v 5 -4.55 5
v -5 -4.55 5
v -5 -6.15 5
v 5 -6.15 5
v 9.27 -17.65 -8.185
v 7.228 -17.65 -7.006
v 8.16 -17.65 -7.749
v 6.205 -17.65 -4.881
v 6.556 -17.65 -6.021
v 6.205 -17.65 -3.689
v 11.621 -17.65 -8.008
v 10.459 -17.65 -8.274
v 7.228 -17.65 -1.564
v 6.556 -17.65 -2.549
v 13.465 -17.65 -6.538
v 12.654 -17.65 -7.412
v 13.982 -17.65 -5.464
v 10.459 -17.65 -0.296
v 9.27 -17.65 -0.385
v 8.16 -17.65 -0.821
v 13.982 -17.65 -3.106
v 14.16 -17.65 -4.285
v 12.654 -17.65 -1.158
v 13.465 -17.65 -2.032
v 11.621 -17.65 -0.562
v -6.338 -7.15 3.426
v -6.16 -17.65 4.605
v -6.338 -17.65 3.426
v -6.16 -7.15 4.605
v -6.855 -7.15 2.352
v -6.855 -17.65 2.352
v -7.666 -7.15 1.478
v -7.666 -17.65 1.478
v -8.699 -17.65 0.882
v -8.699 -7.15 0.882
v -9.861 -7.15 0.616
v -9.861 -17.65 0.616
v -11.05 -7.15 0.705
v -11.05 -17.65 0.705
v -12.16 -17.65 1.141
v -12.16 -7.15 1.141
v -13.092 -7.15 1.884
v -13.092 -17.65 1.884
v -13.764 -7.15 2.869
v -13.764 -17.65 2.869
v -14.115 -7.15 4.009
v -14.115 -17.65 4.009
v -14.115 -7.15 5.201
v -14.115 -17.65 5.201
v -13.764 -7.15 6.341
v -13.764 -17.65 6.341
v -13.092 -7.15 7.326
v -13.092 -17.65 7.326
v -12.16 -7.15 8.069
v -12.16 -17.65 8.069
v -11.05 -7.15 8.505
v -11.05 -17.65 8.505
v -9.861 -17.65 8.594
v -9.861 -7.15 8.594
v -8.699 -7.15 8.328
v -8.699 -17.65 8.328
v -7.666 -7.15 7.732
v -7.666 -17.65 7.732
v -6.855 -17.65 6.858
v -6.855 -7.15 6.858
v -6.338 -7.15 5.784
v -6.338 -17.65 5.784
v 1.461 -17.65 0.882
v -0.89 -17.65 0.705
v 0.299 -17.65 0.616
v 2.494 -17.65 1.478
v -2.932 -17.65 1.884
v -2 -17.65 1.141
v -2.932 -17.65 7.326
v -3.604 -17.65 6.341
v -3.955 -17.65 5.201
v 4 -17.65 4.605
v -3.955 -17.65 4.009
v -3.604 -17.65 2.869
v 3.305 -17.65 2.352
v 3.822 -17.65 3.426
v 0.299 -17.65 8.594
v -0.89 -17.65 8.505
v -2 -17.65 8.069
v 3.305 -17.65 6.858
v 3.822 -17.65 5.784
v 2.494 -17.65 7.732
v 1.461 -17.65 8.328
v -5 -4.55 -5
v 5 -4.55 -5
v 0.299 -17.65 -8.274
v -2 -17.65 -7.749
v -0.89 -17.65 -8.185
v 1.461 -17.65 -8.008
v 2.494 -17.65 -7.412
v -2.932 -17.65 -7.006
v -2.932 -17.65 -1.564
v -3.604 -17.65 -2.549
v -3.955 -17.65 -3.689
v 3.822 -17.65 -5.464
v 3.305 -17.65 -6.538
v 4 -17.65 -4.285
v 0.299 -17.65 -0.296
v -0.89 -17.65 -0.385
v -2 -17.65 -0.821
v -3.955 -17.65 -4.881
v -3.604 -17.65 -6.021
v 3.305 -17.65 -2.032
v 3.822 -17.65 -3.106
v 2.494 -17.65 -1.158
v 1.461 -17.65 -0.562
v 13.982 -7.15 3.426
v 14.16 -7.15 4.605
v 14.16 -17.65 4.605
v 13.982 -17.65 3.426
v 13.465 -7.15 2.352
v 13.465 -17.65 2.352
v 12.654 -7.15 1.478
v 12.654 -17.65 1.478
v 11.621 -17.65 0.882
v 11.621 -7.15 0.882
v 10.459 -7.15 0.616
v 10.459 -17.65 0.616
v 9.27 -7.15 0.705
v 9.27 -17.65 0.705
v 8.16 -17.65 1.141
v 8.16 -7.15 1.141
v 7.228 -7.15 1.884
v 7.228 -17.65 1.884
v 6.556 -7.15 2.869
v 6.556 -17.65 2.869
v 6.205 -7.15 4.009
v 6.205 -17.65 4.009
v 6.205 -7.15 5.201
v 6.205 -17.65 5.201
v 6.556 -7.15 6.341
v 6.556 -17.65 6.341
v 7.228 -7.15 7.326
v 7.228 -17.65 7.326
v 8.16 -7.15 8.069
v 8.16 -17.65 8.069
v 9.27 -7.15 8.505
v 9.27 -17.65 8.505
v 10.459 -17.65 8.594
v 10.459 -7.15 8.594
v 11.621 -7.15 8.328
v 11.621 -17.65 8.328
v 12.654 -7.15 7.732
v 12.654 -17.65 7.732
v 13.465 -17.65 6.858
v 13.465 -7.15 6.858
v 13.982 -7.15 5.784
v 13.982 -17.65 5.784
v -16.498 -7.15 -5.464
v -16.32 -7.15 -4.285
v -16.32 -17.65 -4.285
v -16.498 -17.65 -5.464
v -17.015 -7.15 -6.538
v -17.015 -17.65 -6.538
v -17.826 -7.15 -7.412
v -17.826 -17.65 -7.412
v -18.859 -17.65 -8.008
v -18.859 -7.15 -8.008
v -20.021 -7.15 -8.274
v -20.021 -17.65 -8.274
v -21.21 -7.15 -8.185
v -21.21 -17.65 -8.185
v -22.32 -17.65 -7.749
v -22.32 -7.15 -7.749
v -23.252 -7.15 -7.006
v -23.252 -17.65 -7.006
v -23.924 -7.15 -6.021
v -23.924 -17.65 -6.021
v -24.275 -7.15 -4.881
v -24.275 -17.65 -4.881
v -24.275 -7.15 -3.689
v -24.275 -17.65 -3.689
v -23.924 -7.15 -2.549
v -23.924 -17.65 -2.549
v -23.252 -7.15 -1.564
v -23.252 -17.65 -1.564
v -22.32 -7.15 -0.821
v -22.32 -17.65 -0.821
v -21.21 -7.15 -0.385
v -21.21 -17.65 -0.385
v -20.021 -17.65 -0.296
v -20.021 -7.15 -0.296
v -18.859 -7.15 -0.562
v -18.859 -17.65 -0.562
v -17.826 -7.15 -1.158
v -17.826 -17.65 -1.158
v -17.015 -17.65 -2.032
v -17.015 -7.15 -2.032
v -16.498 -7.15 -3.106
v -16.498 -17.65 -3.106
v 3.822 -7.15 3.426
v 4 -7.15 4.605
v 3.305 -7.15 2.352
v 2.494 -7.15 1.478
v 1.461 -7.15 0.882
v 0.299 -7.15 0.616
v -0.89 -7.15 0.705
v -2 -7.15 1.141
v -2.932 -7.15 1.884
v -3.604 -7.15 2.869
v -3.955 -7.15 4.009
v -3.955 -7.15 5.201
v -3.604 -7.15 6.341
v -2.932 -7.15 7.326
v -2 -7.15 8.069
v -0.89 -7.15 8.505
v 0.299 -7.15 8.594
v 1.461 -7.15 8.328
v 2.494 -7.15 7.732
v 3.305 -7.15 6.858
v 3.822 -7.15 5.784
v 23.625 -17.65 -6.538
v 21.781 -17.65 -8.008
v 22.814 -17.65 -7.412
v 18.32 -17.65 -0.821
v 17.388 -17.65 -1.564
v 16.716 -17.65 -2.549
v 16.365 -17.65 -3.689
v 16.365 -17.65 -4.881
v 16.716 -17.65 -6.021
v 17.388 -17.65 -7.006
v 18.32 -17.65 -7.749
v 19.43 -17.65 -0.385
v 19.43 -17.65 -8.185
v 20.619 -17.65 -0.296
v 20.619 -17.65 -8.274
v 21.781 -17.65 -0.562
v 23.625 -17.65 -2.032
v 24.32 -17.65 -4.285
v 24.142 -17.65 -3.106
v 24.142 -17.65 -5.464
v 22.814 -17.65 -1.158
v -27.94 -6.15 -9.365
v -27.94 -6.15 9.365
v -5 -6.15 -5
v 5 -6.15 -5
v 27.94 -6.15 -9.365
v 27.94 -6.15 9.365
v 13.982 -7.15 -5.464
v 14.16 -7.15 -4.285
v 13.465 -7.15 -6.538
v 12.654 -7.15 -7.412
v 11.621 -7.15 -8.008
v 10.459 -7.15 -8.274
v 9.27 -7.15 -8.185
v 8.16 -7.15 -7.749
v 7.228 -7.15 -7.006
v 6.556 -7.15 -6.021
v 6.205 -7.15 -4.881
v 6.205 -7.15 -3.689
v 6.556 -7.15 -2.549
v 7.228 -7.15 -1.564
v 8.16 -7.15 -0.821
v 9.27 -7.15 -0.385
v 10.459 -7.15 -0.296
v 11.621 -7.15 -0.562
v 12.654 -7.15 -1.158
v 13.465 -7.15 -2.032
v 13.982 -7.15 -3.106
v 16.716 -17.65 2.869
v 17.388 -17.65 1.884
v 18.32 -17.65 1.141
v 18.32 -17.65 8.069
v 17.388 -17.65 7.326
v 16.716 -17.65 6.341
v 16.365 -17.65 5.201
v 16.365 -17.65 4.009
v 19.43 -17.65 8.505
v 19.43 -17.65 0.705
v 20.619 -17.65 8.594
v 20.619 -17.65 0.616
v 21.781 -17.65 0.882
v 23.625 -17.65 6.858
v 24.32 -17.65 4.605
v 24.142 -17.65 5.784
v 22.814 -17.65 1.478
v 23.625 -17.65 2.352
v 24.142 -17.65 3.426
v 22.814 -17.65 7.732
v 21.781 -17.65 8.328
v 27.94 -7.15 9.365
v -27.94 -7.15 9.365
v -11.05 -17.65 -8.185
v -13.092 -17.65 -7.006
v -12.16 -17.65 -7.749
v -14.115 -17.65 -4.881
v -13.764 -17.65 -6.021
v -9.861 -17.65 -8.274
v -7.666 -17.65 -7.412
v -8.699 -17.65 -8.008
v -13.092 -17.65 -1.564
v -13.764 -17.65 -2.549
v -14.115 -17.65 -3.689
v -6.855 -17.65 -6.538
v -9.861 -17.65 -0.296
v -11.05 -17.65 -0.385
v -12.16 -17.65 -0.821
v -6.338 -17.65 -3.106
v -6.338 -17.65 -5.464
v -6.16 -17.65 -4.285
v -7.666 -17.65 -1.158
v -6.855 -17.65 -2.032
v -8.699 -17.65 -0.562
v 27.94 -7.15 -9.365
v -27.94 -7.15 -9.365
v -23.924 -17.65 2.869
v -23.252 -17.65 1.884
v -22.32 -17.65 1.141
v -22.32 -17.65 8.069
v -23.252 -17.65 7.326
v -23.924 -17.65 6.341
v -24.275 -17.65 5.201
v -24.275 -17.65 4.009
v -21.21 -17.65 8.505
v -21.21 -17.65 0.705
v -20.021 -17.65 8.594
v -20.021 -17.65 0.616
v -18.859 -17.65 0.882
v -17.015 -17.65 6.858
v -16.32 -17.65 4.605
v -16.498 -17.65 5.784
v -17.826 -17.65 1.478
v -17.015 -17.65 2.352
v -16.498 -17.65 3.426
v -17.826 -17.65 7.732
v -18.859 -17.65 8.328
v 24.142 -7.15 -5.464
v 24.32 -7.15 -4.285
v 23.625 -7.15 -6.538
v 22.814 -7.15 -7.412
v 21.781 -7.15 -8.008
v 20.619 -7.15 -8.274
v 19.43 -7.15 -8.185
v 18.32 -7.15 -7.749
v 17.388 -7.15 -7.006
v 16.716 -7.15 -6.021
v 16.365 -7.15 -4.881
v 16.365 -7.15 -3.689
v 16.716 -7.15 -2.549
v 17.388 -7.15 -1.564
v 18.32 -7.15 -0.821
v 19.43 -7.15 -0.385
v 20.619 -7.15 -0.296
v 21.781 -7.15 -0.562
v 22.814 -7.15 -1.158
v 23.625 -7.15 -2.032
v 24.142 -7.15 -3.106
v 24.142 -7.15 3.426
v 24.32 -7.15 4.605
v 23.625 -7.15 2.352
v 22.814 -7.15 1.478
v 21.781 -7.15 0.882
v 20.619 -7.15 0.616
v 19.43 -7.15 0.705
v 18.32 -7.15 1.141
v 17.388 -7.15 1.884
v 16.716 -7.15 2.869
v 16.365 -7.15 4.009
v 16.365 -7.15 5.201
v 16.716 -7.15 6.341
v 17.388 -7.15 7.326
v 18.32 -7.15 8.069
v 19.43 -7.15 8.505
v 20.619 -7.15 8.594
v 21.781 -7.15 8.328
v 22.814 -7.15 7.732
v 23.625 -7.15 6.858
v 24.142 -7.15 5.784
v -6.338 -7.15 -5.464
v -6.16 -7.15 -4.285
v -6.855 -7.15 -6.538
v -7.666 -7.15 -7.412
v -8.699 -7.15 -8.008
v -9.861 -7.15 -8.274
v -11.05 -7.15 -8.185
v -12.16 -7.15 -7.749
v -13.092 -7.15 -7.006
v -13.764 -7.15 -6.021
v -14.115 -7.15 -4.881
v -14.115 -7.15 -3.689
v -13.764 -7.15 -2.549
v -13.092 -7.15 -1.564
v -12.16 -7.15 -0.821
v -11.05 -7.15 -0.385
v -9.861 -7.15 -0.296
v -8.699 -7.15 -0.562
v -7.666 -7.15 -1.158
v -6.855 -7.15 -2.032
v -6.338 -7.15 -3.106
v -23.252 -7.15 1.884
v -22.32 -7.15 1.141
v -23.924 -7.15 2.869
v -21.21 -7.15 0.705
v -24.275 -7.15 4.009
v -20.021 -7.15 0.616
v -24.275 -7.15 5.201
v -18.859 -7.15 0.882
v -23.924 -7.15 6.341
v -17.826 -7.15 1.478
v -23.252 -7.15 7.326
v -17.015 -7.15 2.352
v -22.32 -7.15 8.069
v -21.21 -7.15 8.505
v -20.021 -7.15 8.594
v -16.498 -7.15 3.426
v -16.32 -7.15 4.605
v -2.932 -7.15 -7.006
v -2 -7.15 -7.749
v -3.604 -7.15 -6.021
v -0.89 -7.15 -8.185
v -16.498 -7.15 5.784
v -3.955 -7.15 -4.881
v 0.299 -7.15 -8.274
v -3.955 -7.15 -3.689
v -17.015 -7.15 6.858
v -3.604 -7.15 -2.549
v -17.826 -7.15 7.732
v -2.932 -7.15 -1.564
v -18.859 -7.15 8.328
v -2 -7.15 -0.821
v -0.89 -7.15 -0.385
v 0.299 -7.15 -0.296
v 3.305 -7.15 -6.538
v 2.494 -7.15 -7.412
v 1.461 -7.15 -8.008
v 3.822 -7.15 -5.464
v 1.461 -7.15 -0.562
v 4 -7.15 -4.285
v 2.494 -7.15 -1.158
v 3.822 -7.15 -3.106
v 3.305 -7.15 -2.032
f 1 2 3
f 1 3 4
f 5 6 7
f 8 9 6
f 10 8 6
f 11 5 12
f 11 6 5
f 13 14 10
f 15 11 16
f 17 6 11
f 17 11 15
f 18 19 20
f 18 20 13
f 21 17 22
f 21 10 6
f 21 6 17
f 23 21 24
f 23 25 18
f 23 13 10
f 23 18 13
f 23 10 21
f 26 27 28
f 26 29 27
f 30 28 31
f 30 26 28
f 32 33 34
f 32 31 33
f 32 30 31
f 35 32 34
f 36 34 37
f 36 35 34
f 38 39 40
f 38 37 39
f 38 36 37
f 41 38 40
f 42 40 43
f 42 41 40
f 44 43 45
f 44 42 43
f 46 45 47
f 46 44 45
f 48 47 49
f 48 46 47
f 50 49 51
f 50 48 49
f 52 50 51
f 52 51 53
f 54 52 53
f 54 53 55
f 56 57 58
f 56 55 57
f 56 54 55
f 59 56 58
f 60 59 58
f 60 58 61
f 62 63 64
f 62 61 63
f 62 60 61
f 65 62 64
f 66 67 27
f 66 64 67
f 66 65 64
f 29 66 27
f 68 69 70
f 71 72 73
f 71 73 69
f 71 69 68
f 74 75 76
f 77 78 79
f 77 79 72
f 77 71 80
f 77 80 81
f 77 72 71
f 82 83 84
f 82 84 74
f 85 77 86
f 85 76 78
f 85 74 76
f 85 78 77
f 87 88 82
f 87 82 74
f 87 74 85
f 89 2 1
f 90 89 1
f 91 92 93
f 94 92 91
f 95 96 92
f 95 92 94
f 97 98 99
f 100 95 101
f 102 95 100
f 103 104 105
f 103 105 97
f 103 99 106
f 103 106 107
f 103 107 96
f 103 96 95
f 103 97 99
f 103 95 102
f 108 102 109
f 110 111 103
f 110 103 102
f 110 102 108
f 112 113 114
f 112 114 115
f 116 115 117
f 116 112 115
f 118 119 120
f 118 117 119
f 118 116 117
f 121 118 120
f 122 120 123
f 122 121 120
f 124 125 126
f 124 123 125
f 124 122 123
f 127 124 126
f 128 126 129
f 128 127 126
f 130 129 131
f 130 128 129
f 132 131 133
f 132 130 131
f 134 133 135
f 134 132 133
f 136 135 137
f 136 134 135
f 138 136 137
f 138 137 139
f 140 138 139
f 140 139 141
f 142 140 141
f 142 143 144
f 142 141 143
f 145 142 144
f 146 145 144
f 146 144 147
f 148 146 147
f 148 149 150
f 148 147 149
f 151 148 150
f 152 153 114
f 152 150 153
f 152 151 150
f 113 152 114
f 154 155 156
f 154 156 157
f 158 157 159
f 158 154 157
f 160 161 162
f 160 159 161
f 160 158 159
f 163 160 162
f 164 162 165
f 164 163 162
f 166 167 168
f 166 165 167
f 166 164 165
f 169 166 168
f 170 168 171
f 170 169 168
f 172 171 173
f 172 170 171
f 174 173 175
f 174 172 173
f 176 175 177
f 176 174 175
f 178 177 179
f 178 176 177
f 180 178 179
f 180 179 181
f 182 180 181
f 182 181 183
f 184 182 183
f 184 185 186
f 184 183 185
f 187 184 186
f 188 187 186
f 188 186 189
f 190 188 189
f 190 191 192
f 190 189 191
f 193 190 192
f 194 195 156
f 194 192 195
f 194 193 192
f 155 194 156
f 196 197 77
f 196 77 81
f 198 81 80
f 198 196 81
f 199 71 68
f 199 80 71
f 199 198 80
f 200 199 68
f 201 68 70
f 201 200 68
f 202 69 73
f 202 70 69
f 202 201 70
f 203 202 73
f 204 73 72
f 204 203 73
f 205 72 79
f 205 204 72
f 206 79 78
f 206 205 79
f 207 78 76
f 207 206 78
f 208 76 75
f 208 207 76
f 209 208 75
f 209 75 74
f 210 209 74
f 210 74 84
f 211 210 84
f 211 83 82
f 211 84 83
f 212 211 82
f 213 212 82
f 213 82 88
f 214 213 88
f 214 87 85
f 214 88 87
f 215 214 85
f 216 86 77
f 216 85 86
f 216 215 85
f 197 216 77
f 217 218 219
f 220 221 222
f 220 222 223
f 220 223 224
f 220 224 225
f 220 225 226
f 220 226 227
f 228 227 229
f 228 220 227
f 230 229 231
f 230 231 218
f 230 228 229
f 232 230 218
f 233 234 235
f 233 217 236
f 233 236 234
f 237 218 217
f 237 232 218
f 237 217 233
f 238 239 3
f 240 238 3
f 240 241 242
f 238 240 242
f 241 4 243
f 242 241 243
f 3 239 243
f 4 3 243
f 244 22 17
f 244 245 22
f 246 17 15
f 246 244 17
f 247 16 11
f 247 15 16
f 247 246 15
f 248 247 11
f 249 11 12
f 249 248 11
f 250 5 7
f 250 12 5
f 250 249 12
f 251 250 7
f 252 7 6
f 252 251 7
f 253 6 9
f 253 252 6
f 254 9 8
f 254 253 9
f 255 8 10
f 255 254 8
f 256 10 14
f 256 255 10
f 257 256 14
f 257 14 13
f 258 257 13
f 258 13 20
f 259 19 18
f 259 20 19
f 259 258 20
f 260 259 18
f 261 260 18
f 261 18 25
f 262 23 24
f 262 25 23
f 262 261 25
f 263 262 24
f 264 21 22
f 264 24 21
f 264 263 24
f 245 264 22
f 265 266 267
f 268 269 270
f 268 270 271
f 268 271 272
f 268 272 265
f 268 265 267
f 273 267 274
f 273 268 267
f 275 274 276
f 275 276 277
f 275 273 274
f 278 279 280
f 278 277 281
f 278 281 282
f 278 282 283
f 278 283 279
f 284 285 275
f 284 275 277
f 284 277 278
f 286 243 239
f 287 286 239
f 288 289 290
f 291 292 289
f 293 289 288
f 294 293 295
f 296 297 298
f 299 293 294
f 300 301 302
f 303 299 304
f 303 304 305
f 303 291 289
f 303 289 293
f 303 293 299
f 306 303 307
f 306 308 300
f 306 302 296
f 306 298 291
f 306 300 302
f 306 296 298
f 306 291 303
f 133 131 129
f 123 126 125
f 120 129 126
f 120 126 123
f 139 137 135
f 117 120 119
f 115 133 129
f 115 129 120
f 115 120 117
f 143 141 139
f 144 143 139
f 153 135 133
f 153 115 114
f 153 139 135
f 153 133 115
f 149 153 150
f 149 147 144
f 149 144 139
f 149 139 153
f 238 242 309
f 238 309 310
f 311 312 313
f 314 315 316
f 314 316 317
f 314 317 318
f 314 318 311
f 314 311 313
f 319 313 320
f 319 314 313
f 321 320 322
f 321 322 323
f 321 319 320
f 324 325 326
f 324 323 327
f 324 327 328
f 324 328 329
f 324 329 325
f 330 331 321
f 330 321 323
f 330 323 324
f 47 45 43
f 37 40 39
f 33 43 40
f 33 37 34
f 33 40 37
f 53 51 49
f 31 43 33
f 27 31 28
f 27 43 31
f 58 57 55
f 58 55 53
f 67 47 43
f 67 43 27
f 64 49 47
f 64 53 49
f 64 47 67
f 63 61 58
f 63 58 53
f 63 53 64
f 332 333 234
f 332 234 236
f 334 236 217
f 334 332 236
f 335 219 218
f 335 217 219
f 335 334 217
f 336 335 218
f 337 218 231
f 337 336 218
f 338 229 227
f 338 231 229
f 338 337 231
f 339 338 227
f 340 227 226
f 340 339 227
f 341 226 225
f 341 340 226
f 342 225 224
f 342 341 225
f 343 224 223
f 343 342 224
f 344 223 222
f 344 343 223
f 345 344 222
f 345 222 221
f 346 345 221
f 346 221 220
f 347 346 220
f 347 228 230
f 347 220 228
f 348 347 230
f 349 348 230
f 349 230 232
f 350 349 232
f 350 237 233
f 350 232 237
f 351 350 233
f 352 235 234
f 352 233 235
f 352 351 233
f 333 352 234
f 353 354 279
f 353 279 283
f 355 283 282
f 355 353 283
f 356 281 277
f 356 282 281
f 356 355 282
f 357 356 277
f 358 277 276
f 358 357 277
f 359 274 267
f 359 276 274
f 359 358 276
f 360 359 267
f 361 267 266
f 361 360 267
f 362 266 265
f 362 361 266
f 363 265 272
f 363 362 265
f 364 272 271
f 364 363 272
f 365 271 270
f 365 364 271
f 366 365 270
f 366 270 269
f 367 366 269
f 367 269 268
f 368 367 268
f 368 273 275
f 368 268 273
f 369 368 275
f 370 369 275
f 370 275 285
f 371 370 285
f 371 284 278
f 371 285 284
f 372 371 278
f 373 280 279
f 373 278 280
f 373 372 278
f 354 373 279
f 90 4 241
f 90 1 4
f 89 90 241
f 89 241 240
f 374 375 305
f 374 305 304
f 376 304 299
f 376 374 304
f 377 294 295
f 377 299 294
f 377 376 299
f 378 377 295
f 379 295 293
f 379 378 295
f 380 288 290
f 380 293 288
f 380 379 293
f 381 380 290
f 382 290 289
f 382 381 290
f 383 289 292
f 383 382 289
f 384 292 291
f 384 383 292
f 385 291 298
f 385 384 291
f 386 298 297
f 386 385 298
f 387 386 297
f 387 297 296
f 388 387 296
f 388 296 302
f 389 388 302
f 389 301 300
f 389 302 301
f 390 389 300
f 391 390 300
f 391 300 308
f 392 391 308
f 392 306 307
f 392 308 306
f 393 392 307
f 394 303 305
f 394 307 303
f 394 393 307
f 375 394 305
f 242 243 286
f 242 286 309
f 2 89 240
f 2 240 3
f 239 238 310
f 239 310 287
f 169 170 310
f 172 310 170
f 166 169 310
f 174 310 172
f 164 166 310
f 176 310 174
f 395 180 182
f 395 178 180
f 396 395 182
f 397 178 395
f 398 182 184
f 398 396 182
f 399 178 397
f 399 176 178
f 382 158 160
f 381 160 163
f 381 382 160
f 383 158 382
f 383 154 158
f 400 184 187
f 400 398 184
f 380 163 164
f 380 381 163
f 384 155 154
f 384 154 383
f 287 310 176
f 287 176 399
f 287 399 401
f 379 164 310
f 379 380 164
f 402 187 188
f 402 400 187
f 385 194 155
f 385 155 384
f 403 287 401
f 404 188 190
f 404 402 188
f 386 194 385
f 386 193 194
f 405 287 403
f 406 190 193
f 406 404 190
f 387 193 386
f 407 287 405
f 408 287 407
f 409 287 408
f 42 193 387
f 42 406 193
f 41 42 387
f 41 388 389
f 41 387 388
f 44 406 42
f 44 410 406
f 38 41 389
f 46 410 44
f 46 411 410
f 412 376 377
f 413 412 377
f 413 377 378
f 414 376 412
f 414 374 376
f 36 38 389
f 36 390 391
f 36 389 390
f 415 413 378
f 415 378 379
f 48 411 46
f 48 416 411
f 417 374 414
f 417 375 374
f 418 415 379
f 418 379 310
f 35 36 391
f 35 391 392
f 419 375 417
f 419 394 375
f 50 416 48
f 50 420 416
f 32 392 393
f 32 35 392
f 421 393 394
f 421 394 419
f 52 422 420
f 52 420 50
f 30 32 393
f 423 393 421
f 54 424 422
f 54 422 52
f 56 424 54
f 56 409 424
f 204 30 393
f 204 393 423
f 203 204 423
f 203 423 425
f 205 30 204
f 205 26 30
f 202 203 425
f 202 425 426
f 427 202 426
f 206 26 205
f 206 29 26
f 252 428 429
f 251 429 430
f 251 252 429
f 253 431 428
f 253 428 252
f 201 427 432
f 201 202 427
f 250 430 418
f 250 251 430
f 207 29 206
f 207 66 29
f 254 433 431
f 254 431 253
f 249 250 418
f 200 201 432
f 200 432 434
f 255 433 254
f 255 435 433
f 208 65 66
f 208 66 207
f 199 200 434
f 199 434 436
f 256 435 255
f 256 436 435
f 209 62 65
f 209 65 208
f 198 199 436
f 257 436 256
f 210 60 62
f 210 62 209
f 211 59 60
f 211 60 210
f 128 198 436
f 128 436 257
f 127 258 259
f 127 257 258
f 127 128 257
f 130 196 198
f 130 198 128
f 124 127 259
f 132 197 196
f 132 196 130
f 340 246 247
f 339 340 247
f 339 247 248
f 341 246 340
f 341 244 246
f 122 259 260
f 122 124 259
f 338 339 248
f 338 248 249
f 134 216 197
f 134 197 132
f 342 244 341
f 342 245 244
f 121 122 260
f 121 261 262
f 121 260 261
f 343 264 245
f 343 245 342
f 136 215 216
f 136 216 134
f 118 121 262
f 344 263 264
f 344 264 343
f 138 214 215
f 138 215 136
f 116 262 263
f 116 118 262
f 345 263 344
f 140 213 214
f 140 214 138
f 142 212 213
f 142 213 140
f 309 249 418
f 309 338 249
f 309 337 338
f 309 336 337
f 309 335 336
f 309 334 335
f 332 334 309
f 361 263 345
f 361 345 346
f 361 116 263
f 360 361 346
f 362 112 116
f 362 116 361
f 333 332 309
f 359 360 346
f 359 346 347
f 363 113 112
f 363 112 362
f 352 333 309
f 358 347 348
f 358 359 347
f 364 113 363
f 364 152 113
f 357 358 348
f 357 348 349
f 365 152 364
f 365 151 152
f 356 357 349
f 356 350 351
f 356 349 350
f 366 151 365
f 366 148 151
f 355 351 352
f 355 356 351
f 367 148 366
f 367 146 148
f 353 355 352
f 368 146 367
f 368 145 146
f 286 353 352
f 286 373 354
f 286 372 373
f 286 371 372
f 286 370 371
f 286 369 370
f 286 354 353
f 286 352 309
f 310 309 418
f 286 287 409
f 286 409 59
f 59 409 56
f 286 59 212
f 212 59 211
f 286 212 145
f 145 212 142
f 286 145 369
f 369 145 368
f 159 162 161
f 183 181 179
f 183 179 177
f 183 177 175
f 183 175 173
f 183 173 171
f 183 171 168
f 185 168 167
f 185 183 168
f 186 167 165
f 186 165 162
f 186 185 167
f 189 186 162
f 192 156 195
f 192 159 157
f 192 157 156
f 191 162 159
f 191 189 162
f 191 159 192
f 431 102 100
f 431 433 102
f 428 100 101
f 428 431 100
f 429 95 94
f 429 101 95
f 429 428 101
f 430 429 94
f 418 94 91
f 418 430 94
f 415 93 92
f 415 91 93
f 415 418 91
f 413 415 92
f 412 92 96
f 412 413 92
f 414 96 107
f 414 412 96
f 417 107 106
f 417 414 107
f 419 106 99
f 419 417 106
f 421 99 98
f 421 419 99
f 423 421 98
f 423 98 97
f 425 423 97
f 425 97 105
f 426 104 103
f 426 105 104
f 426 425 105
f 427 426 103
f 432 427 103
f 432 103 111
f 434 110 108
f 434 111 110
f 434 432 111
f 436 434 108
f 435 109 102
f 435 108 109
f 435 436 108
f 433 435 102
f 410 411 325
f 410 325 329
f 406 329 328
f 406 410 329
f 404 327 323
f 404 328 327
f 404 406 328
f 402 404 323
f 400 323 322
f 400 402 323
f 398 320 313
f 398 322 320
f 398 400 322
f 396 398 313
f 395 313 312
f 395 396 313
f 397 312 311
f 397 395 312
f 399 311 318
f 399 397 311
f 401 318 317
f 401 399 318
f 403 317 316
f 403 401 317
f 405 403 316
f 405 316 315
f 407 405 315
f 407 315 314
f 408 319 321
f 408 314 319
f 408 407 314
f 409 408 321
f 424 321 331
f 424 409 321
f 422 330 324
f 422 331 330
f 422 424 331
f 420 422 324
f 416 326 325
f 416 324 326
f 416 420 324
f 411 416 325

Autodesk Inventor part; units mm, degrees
ref_plane "YZ Plane" through (0, 0, 0) normal (1, 0, 0) x (0, 1, 0)
ref_plane "XZ Plane" through (0, 0, 0) normal (0, 1, 0) x (-1, 0, 0)
ref_plane "XY Plane" through (0, 0, 0) normal (0, 0, 1) x (1, 0, 0)
sketch "Szkic1" plane through (0, 0, 0) normal (0, 1, 0) x (-1, 0, 0)
  line L0 (27.94, 9.365) -> (-27.94, 9.365)
  line L1 (-27.94, 9.365) -> (-27.94, -9.365)
  line L2 (-27.94, -9.365) -> (27.94, -9.365)
  line L3 (27.94, -9.365) -> (27.94, 9.365)
  point P0 (0, 0)
  dimension "d0" = 18.73
  dimension "d1" = 9.365
  dimension "d2" = 55.88
  dimension "d3" = 27.94
extrude "Wyciągnięcie proste1" add sketch "Szkic1" along normal blind 1
sketch "Szkic2" plane through (0, 1, 0) normal (0, 1, 0) x (1, 0, 0)
  line L0 (-25.4, -8.095) -> (-20.32, -8.095)
  line L1 (-20.32, -8.095) -> (-20.32, -2.065)
  line L2 (-20.32, -2.065) -> (-25.4, -2.065)
  line L3 (-25.4, -2.065) -> (-25.4, -8.095)
  line L4 (-27.94, 9.365) -> (-27.94, -9.365) projected
  line L5 (-27.94, -9.365) -> (27.94, -9.365) projected
  line L6 (-19.68, -8.095) -> (-14.6, -8.095)
  line L7 (-14.6, -8.095) -> (-14.6, -2.065)
  line L8 (-14.6, -2.065) -> (-19.68, -2.065)
  line L9 (-19.68, -2.065) -> (-19.68, -8.095)
  line L10 (-13.96, -8.095) -> (-8.88, -8.095)
  line L11 (-8.88, -8.095) -> (-8.88, -2.065)
  line L12 (-8.88, -2.065) -> (-13.96, -2.065)
  line L13 (-13.96, -2.065) -> (-13.96, -8.095)
  line L14 (-8.24, -8.095) -> (-3.16, -8.095)
  line L15 (-3.16, -8.095) -> (-3.16, -2.065)
  line L16 (-3.16, -2.065) -> (-8.24, -2.065)
  line L17 (-8.24, -2.065) -> (-8.24, -8.095)
  line L18 (-2.52, -8.095) -> (2.56, -8.095)
  line L19 (2.56, -8.095) -> (2.56, -2.065)
  line L20 (2.56, -2.065) -> (-2.52, -2.065)
  line L21 (-2.52, -2.065) -> (-2.52, -8.095)
  line L22 (3.2, -8.095) -> (8.28, -8.095)
  line L23 (8.28, -8.095) -> (8.28, -2.065)
  line L24 (8.28, -2.065) -> (3.2, -2.065)
  line L25 (3.2, -2.065) -> (3.2, -8.095)
  line L26 (8.92, -8.095) -> (14, -8.095)
  line L27 (14, -8.095) -> (14, -2.065)
  line L28 (14, -2.065) -> (8.92, -2.065)
  line L29 (8.92, -2.065) -> (8.92, -8.095)
  line L30 (14.64, -8.095) -> (19.72, -8.095)
  line L31 (19.72, -8.095) -> (19.72, -2.065)
  line L32 (19.72, -2.065) -> (14.64, -2.065)
  line L33 (14.64, -2.065) -> (14.64, -8.095)
  line L34 (20.36, -8.095) -> (25.44, -8.095)
  line L35 (25.44, -8.095) -> (25.44, -2.065)
  line L36 (25.44, -2.065) -> (20.36, -2.065)
  line L37 (20.36, -2.065) -> (20.36, -8.095)
  line L38 (-25.4, -0.475) -> (-20.32, -0.475)
  line L39 (-20.32, -0.475) -> (-20.32, 5.555)
  line L40 (-20.32, 5.555) -> (-25.4, 5.555)
  line L41 (-25.4, 5.555) -> (-25.4, -0.475)
  line L42 (-19.68, -0.475) -> (-14.6, -0.475)
  line L43 (-14.6, -0.475) -> (-14.6, 5.555)
  line L44 (-14.6, 5.555) -> (-19.68, 5.555)
  line L45 (-19.68, 5.555) -> (-19.68, -0.475)
  line L46 (-13.96, -0.475) -> (-8.88, -0.475)
  line L47 (-8.88, -0.475) -> (-8.88, 5.555)
  line L48 (-8.88, 5.555) -> (-13.96, 5.555)
  line L49 (-13.96, 5.555) -> (-13.96, -0.475)
  line L50 (19.72, 5.555) -> (14.64, 5.555)
  line L51 (19.72, -0.475) -> (19.72, 5.555)
  line L52 (14.64, -0.475) -> (19.72, -0.475)
  line L53 (14.64, 5.555) -> (14.64, -0.475)
  line L54 (25.44, 5.555) -> (20.36, 5.555)
  line L55 (25.44, -0.475) -> (25.44, 5.555)
  line L56 (20.36, -0.475) -> (25.44, -0.475)
  line L57 (20.36, 5.555) -> (20.36, -0.475)
  line L58 (-3.16, 5.555) -> (-8.24, 5.555)
  line L59 (-3.16, -0.475) -> (-3.16, 5.555)
  line L60 (-8.24, -0.475) -> (-3.16, -0.475)
  line L61 (-8.24, 5.555) -> (-8.24, -0.475)
  line L62 (2.56, 5.555) -> (-2.52, 5.555)
  line L63 (2.56, -0.475) -> (2.56, 5.555)
  line L64 (-2.52, -0.475) -> (2.56, -0.475)
  line L65 (-2.52, 5.555) -> (-2.52, -0.475)
  line L66 (8.28, 5.555) -> (3.2, 5.555)
  line L67 (8.28, -0.475) -> (8.28, 5.555)
  line L68 (3.2, -0.475) -> (8.28, -0.475)
  line L69 (3.2, 5.555) -> (3.2, -0.475)
  line L70 (14, 5.555) -> (8.92, 5.555)
  line L71 (14, -0.475) -> (14, 5.555)
  line L72 (8.92, -0.475) -> (14, -0.475)
  line L73 (8.92, 5.555) -> (8.92, -0.475)
  point P0 (0, 0)
  dimension "d6" = 6.03
  dimension "d7" = 5.08
  dimension "d8" = 2.54
  dimension "d9" = 1.27
  dimension "d10" = 5.08
  dimension "d11" = 6.03
  dimension "d12" = 1.27
  dimension "d13" = 0.64
  dimension "d14" = 5.08
  dimension "d15" = 6.03
  dimension "d16" = 1.27
  dimension "d17" = 0.64
  dimension "d18" = 5.08
  dimension "d19" = 6.03
  dimension "d20" = 1.27
  dimension "d21" = 0.64
  dimension "d22" = 5.08
  dimension "d23" = 6.03
  dimension "d24" = 1.27
  dimension "d25" = 0.64
  dimension "d26" = 5.08
  dimension "d27" = 6.03
  dimension "d28" = 5.08
  dimension "d29" = 6.03
  dimension "d30" = 5.08
  dimension "d31" = 6.03
  dimension "d32" = 5.08
  dimension "d33" = 6.03
  dimension "d34" = 0.64
  dimension "d35" = 0.64
  dimension "d36" = 0.64
  dimension "d37" = 0.64
  dimension "d38" = 1.27
  dimension "d39" = 1.27
  dimension "d40" = 1.27
  dimension "d41" = 1.27
  dimension "d42" = 6.03
  dimension "d43" = 5.08
  dimension "d44" = 6.03
  dimension "d45" = 5.08
  dimension "d46" = 6.03
  dimension "d47" = 5.08
  dimension "d48" = 1.59
  dimension "d49" = 0
  dimension "d50" = 0
  dimension "d51" = 0
  dimension "d52" = 0
  dimension "d53" = 0
  dimension "d54" = 5.08
  dimension "d55" = 6.03
  dimension "d56" = 5.08
  dimension "d57" = 6.03
  dimension "d58" = 0.64
  dimension "d59" = 0
  dimension "d60" = 0
  dimension "d61" = 0
  dimension "d62" = 5.08
  dimension "d63" = 6.03
  dimension "d64" = 5.08
  dimension "d65" = 6.03
  dimension "d66" = 0.64
  dimension "d67" = 0
  dimension "d68" = 0
  dimension "d69" = 0
extrude "Wyciągnięcie proste2" add sketch "Szkic2" along normal blind 1
chamfer "Faza1" distance 0.2 angle 45 4 edges at (22.9, 2, 8.095) (25.44, 2, 5.08) (20.36, 2, 5.08) (22.9, 2, 2.065)
chamfer "Faza2" distance 0.2 angle 45 68 edges at (17.18, 2, 8.095) (19.72, 2, 5.08) (14.64, 2, 5.08) (17.18, 2, 2.065) (14, 2, 5.08) (11.46, 2, 8.095) (8.92, 2, 5.08) (11.46, 2, 2.065) (8.28, 2, 5.08) (5.74, 2, 8.095) (3.2, 2, 5.08) (5.74, 2, 2.065) (0.02, 2, 8.095) (-5.7, 2, 8.095) (-11.42, 2, 8.095) (-17.14, 2, 8.095) (-22.86, 2, 8.095) (-25.4, 2, 5.08) (-22.86, 2, 2.065) (-17.14, 2, 2.065) (-19.68, 2, 5.08) (-14.6, 2, 5.08) (-13.96, 2, 5.08) (-8.88, 2, 5.08) (-11.42, 2, 2.065) (-5.7, 2, 2.065) (-3.16, 2, 5.08) (-8.24, 2, 5.08) (-20.32, 2, 5.08) (-20.32, 2, -2.54) (-22.86, 2, 0.475) (-25.4, 2, -2.54) (-22.86, 2, -5.555) (-17.14, 2, -5.555) (-19.68, 2, -2.54) (-17.14, 2, 0.475) (-14.6, 2, -2.54) (-11.42, 2, 0.475) (-13.96, 2, -2.54) (-11.42, 2, -5.555) (-8.88, 2, -2.54) (-5.7, 2, 0.475) (-8.24, 2, -2.54) (-5.7, 2, -5.555) (-3.16, 2, -2.54) (0.02, 2, 2.065) (-2.52, 2, 5.08) (0.02, 2, 0.475) (-2.52, 2, -2.54) (0.02, 2, -5.555) (2.56, 2, -2.54) (5.74, 2, 0.475) (3.2, 2, -2.54) (5.74, 2, -5.555) (8.28, 2, -2.54) (11.46, 2, 0.475) (8.92, 2, -2.54) (11.46, 2, -5.555) (14, 2, -2.54) (17.18, 2, 0.475) (17.18, 2, -5.555) (14.64, 2, -2.54) (19.72, 2, -2.54) (22.9, 2, 0.475) (20.36, 2, -2.54) (22.9, 2, -5.555) (25.44, 2, -2.54) (2.56, 2, 5.08)
chamfer "Faza3" distance 0.5 angle 45 18 edges at (25.44, 1.4, 8.095) (19.72, 1.4, 8.095) (14, 1.4, 8.095) (8.28, 1.4, 8.095) (2.56, 1.4, 8.095) (2.56, 1.4, 0.475) (8.28, 1.4, 0.475) (14, 1.4, 0.475) (19.72, 1.4, 0.475) (25.44, 1.4, 0.475) (-3.16, 1.4, 0.475) (-3.16, 1.4, 8.095) (-8.88, 1.4, 8.095) (-14.6, 1.4, 8.095) (-8.88, 1.4, 0.475) (-14.6, 1.4, 0.475) (-20.32, 1.4, 0.475) (-20.32, 1.4, 8.095)
sketch "Szkic3" plane through (0, 0, 0) normal (0, -1, 0) x (1, 0, 0)
  line L0 (-25.08, -2.085) -> (-21.9, -2.085)
  line L1 (-21.9, -2.085) -> (-21.9, -8.435)
  line L2 (-21.9, -8.435) -> (-25.08, -8.435)
  line L3 (-25.08, -8.435) -> (-25.08, -2.085)
  line L4 (-25.4, 0.475) -> (-25.4, -5.555) projected
  line L5 (27.94, -9.365) -> (-27.94, -9.365) projected
  line L6 (-19.36, -2.085) -> (-16.18, -2.085)
  line L7 (-16.18, -2.085) -> (-16.18, -8.435)
  line L8 (-16.18, -8.435) -> (-19.36, -8.435)
  line L9 (-19.36, -8.435) -> (-19.36, -2.085)
  line L10 (-19.68, 0.475) -> (-19.68, -5.555) projected
  line L11 (-13.64, -2.085) -> (-10.46, -2.085)
  line L12 (-10.46, -2.085) -> (-10.46, -8.435)
  line L13 (-10.46, -8.435) -> (-13.64, -8.435)
  line L14 (-13.64, -8.435) -> (-13.64, -2.085)
  line L15 (-7.92, -2.085) -> (-4.74, -2.085)
  line L16 (-4.74, -2.085) -> (-4.74, -8.435)
  line L17 (-4.74, -8.435) -> (-7.92, -8.435)
  line L18 (-7.92, -8.435) -> (-7.92, -2.085)
  line L19 (-2.2, -2.085) -> (0.98, -2.085)
  line L20 (0.98, -2.085) -> (0.98, -8.435)
  line L21 (0.98, -8.435) -> (-2.2, -8.435)
  line L22 (-2.2, -8.435) -> (-2.2, -2.085)
  line L23 (3.52, -2.085) -> (6.7, -2.085)
  line L24 (6.7, -2.085) -> (6.7, -8.435)
  line L25 (6.7, -8.435) -> (3.52, -8.435)
  line L26 (3.52, -8.435) -> (3.52, -2.085)
  line L27 (9.24, -2.085) -> (12.42, -2.085)
  line L28 (12.42, -2.085) -> (12.42, -8.435)
  line L29 (12.42, -8.435) -> (9.24, -8.435)
  line L30 (9.24, -8.435) -> (9.24, -2.085)
  line L31 (14.96, -8.435) -> (14.96, -2.085)
  line L32 (14.96, -2.085) -> (18.14, -2.085)
  line L33 (18.14, -2.085) -> (18.14, -8.435)
  line L34 (18.14, -8.435) -> (14.96, -8.435)
  line L35 (20.68, -8.435) -> (20.68, -2.085)
  line L36 (20.68, -2.085) -> (23.86, -2.085)
  line L37 (23.86, -2.085) -> (23.86, -8.435)
  line L38 (23.86, -8.435) -> (20.68, -8.435)
  point P0 (0, 0)
  dimension "d89" = 6.35
  dimension "d90" = 3.18
  dimension "d91" = 0.32
  dimension "d92" = 0.93
  dimension "d93" = 6.35
  dimension "d94" = 3.18
  dimension "d95" = 0.32
  dimension "d96" = 0
  dimension "d97" = 6.35
  dimension "d98" = 3.18
  dimension "d99" = 2.54
  dimension "d100" = 0
  dimension "d101" = 6.35
  dimension "d102" = 3.18
  dimension "d103" = 6.35
  dimension "d104" = 3.18
  dimension "d105" = 6.35
  dimension "d106" = 3.18
  dimension "d107" = 6.35
  dimension "d108" = 3.18
  dimension "d109" = 0
  dimension "d110" = 0
  dimension "d111" = 2.54
  dimension "d112" = 2.54
  dimension "d113" = 2.54
  dimension "d114" = 2.54
  dimension "d115" = 6.35
  dimension "d116" = 3.18
  dimension "d117" = 6.35
  dimension "d118" = 3.18
  dimension "d119" = 2.54
  dimension "d120" = 2.54
extrude "Wyciągnięcie proste3" add sketch "Szkic3" along normal blind 0.35
chamfer "Faza4" distance 0.35 angle 45 18 edges at (22.27, -0.35, -2.085) (16.55, -0.35, -2.085) (10.83, -0.35, -2.085) (5.11, -0.35, -2.085) (-0.61, -0.35, -2.085) (-6.33, -0.35, -2.085) (-12.05, -0.35, -2.085) (-17.77, -0.35, -2.085) (-23.49, -0.35, -2.085) (-23.49, -0.35, -8.435) (-17.77, -0.35, -8.435) (-12.05, -0.35, -8.435) (-6.33, -0.35, -8.435) (-0.61, -0.35, -8.435) (5.11, -0.35, -8.435) (10.83, -0.35, -8.435) (16.55, -0.35, -8.435) (22.27, -0.35, -8.435)
sketch "Szkic4" plane through (0, 0, 0) normal (0, -1, 0) x (1, 0, 0)
  line L0 (-16.32, -0.535) -> (-13.32, -0.535)
  line L1 (-13.32, -0.535) -> (-13.32, -1.935)
  line L2 (-13.32, -1.935) -> (-16.32, -1.935)
  line L3 (-16.32, -1.935) -> (-16.32, -0.535)
  line L4 (-25.08, -2.085) -> (-21.9, -2.085) projected
  line L5 (-10.46, -8.085) -> (-10.46, -2.435) projected
  line L6 (0.84, -0.535) -> (3.84, -0.535)
  line L7 (3.84, -0.535) -> (3.84, -1.935)
  line L8 (3.84, -1.935) -> (0.84, -1.935)
  line L9 (0.84, -1.935) -> (0.84, -0.535)
  line L10 (6.7, -8.085) -> (6.7, -2.435) projected
  line L11 (-2.2, -2.085) -> (0.98, -2.085) projected
  line L12 (18, -0.535) -> (21, -0.535)
  line L13 (21, -0.535) -> (21, -1.935)
  line L14 (21, -1.935) -> (18, -1.935)
  line L15 (18, -1.935) -> (18, -0.535)
  line L16 (23.86, -8.085) -> (23.86, -2.435) projected
  line L17 (14.96, -2.085) -> (18.14, -2.085) projected
  point P0 (0, 0)
  dimension "d126" = 1.4
  dimension "d127" = 3
  dimension "d128" = 0.15
  dimension "d129" = 2.86
  dimension "d130" = 1.4
  dimension "d131" = 3
  dimension "d132" = 2.86
  dimension "d133" = 0.15
  dimension "d134" = 1.4
  dimension "d135" = 3
  dimension "d136" = 2.86
  dimension "d137" = 0.15
extrude "Wyciągnięcie proste4" add sketch "Szkic4" along normal blind 1.1
chamfer "Faza5" distance 0.6 angle 25 1 edges at (-14.82, -1.1, -0.535) measured on face at (-15.32, -0.3667, -0.535)
chamfer "Faza6" distance 0.6 angle 25 1 edges at (2.34, -1.1, -0.535) measured on face at (1.84, -0.3667, -0.535)
chamfer "Faza7" distance 0.6 angle 25 1 edges at (19.5, -1.1, -0.535) measured on face at (19, -0.3667, -0.535)
chamfer "Faza8" distance 0.6 angle 25 1 edges at (19.5, -1.1, -1.935) measured on face at (20, -0.3667, -1.935)
chamfer "Faza9" distance 0.6 angle 25 1 edges at (2.34, -1.1, -1.935) measured on face at (2.84, -0.3667, -1.935)
chamfer "Faza10" distance 0.6 angle 25 1 edges at (-14.82, -1.1, -1.935) measured on face at (-14.32, -0.3667, -1.935)
chamfer "Faza11" distance 0.6 angle 25 1 edges at (-13.32, -1.1, -1.235) measured on face at (-13.32, -0.7, -1.0949)
chamfer "Faza12" distance 0.6 angle 25 1 edges at (3.84, -1.1, -1.235) measured on face at (3.84, -0.7, -1.0949)
chamfer "Faza13" distance 0.6 angle 25 1 edges at (21, -1.1, -1.235) measured on face at (21, -0.7, -1.0949)
chamfer "Faza14" distance 0.6 angle 25 1 edges at (18, -1.1, -1.235) measured on face at (18, -0.7, -1.3751)
chamfer "Faza15" distance 0.6 angle 25 1 edges at (0.84, -1.1, -1.235) measured on face at (0.84, -0.7, -1.3751)
chamfer "Faza16" distance 0.6 angle 25 1 edges at (-16.32, -1.1, -1.235) measured on face at (-16.32, -0.7, -1.3751)
ref_plane "Płaszczyzna konstrukcyjna1" through (0, -3.55, 0) normal (0, -1, 0) x (1, 0, 0)
sketch "Szkic5" plane through (0, -3.55, 0) normal (0, -1, 0) x (1, 0, 0)
  line L0 (-22.54, 4.285) -> (-15.54, 4.285)
  line L1 (-15.54, 4.285) -> (-15.54, -2.715)
  line L2 (-15.54, -2.715) -> (-22.54, -2.715)
  line L3 (-22.54, -2.715) -> (-22.54, 4.285)
  line L4 (-27.94, -9.365) -> (-27.94, 9.365) projected
  line L5 (-27.94, 9.365) -> (27.94, 9.365) projected
  line L6 (-3.5, 4.285) -> (3.5, 4.285)
  line L7 (3.5, 4.285) -> (3.5, -2.715)
  line L8 (3.5, -2.715) -> (-3.5, -2.715)
  line L9 (-3.5, -2.715) -> (-3.5, 4.285)
  line L10 (15.54, 4.285) -> (22.54, 4.285)
  line L11 (22.54, 4.285) -> (22.54, -2.715)
  line L12 (22.54, -2.715) -> (15.54, -2.715)
  line L13 (15.54, -2.715) -> (15.54, 4.285)
  line L14 (27.94, 9.365) -> (27.94, -9.365) projected
  point P0 (0, 0)
  dimension "d177" = 7
  dimension "d178" = 7
  dimension "d179" = 5.4
  dimension "d180" = 5.08
  dimension "d181" = 7
  dimension "d182" = 7
  dimension "d183" = 7
  dimension "d184" = 7
  dimension "d185" = 5.4
  dimension "d186" = 0
  dimension "d187" = 0
  dimension "d188" = 3.5
extrude "Wyciągnięcie proste5" add sketch "Szkic5" along normal blind 1
sketch "Szkic6" plane through (0, -3.55, 0) normal (0, 1, 0) x (1, 0, 0)
  line L0 (27.94, 9.365) -> (-27.94, 9.365) projected
  line L1 (-27.94, -9.365) -> (27.94, -9.365) projected
  line L2 (-27.94, 9.365) -> (27.94, 9.365)
  line L3 (27.94, 9.365) -> (27.94, -9.365)
  line L4 (27.94, -9.365) -> (-27.94, -9.365)
  line L5 (-27.94, -9.365) -> (-27.94, 9.365)
  point P0 (0, 0)
extrude "Wyciągnięcie proste6" add sketch "Szkic6" along normal blind 1
sketch "Szkic7" plane through (0, -4.55, 0) normal (0, -1, 0) x (1, 0, 0)
  line L0 (-5, 5) -> (5, 5)
  line L1 (5, 5) -> (5, -5)
  line L2 (5, -5) -> (-5, -5)
  line L3 (-5, -5) -> (-5, 5)
  point P0 (0, 0)
  dimension "d193" = 10
  dimension "d194" = 10
  dimension "d195" = 5
  dimension "d196" = 5
extrude "Wyciągnięcie proste7" add sketch "Szkic7" along normal blind 1.6
sketch "Szkic8" plane through (0, -6.15, 0) normal (0, -1, 0) x (1, 0, 0)
  line L0 (27.94, 9.365) -> (27.94, -9.365) projected
  line L1 (27.94, 9.365) -> (-27.94, 9.365) projected
  line L2 (27.94, -9.365) -> (-27.94, -9.365)
  line L3 (-27.94, -9.365) -> (-27.94, 9.365)
  line L4 (-27.94, 9.365) -> (27.94, 9.365)
  line L5 (27.94, 9.365) -> (27.94, -9.365)
  point P0 (0, 0)
extrude "Wyciągnięcie proste8" add sketch "Szkic8" along normal blind 1
sketch "Szkic9" plane through (0, -7.15, 0) normal (0, -1, 0) x (1, 0, 0)
  circle A0 centre (20.32, -4.285) radius 4
  circle A1 centre (20.32, 4.605) radius 4
  line L0 (27.94, -9.365) -> (27.94, 9.365) projected
  circle A2 centre (10.16, -4.285) radius 4
  circle A3 centre (10.16, 4.605) radius 4
  circle A4 centre (0, -4.285) radius 4
  circle A5 centre (-10.16, -4.285) radius 4
  circle A6 centre (-20.32, -4.285) radius 4
  circle A7 centre (0, 4.605) radius 4
  circle A8 centre (-10.16, 4.605) radius 4
  line L1 (-20.32, 7.595) -> (-20.32, 2.065) projected
  circle A9 centre (-20.32, 4.605) radius 4
  line L2 (-27.94, -9.365) -> (27.94, -9.365) projected
  point P0 (0, 0)
  dimension "d201" = 8
  dimension "d202" = 8
  dimension "d203" = 8.89
  dimension "d204" = 7.62
  dimension "d205" = 7.62
  dimension "d206" = 8
  dimension "d207" = 10.16
  dimension "d208" = 0
  dimension "d209" = 8
  dimension "d210" = 8
  dimension "d211" = 8
  dimension "d212" = 8
  dimension "d213" = 10.16
  dimension "d214" = 10.16
  dimension "d215" = 10.16
  dimension "d216" = 8
  dimension "d217" = 8
  dimension "d218" = 8
  dimension "d219" = 5.08
  dimension "d220" = 0
  dimension "d221" = 0
  dimension "d222" = 0
  dimension "d223" = 0
extrude "Wyciągnięcie proste9" add sketch "Szkic9" along normal blind 10.5
sketch "Sketch10" plane through (0, -4.55, 0) normal (0, 1, 0) x (1, 0, 0)
  line L0 (-27.94, -9.365) -> (27.94, -9.365)
  line L1 (27.94, -9.365) -> (27.94, 9.365)
  line L2 (27.94, 9.365) -> (-27.94, 9.365)
  line L3 (-27.94, 9.365) -> (-27.94, -9.365)
  point P0 (0, 0)
extrude "Extrusion10" cut sketch "Sketch10" along normal blind 10
properties part number "UberDriver_1" material "Silver"
